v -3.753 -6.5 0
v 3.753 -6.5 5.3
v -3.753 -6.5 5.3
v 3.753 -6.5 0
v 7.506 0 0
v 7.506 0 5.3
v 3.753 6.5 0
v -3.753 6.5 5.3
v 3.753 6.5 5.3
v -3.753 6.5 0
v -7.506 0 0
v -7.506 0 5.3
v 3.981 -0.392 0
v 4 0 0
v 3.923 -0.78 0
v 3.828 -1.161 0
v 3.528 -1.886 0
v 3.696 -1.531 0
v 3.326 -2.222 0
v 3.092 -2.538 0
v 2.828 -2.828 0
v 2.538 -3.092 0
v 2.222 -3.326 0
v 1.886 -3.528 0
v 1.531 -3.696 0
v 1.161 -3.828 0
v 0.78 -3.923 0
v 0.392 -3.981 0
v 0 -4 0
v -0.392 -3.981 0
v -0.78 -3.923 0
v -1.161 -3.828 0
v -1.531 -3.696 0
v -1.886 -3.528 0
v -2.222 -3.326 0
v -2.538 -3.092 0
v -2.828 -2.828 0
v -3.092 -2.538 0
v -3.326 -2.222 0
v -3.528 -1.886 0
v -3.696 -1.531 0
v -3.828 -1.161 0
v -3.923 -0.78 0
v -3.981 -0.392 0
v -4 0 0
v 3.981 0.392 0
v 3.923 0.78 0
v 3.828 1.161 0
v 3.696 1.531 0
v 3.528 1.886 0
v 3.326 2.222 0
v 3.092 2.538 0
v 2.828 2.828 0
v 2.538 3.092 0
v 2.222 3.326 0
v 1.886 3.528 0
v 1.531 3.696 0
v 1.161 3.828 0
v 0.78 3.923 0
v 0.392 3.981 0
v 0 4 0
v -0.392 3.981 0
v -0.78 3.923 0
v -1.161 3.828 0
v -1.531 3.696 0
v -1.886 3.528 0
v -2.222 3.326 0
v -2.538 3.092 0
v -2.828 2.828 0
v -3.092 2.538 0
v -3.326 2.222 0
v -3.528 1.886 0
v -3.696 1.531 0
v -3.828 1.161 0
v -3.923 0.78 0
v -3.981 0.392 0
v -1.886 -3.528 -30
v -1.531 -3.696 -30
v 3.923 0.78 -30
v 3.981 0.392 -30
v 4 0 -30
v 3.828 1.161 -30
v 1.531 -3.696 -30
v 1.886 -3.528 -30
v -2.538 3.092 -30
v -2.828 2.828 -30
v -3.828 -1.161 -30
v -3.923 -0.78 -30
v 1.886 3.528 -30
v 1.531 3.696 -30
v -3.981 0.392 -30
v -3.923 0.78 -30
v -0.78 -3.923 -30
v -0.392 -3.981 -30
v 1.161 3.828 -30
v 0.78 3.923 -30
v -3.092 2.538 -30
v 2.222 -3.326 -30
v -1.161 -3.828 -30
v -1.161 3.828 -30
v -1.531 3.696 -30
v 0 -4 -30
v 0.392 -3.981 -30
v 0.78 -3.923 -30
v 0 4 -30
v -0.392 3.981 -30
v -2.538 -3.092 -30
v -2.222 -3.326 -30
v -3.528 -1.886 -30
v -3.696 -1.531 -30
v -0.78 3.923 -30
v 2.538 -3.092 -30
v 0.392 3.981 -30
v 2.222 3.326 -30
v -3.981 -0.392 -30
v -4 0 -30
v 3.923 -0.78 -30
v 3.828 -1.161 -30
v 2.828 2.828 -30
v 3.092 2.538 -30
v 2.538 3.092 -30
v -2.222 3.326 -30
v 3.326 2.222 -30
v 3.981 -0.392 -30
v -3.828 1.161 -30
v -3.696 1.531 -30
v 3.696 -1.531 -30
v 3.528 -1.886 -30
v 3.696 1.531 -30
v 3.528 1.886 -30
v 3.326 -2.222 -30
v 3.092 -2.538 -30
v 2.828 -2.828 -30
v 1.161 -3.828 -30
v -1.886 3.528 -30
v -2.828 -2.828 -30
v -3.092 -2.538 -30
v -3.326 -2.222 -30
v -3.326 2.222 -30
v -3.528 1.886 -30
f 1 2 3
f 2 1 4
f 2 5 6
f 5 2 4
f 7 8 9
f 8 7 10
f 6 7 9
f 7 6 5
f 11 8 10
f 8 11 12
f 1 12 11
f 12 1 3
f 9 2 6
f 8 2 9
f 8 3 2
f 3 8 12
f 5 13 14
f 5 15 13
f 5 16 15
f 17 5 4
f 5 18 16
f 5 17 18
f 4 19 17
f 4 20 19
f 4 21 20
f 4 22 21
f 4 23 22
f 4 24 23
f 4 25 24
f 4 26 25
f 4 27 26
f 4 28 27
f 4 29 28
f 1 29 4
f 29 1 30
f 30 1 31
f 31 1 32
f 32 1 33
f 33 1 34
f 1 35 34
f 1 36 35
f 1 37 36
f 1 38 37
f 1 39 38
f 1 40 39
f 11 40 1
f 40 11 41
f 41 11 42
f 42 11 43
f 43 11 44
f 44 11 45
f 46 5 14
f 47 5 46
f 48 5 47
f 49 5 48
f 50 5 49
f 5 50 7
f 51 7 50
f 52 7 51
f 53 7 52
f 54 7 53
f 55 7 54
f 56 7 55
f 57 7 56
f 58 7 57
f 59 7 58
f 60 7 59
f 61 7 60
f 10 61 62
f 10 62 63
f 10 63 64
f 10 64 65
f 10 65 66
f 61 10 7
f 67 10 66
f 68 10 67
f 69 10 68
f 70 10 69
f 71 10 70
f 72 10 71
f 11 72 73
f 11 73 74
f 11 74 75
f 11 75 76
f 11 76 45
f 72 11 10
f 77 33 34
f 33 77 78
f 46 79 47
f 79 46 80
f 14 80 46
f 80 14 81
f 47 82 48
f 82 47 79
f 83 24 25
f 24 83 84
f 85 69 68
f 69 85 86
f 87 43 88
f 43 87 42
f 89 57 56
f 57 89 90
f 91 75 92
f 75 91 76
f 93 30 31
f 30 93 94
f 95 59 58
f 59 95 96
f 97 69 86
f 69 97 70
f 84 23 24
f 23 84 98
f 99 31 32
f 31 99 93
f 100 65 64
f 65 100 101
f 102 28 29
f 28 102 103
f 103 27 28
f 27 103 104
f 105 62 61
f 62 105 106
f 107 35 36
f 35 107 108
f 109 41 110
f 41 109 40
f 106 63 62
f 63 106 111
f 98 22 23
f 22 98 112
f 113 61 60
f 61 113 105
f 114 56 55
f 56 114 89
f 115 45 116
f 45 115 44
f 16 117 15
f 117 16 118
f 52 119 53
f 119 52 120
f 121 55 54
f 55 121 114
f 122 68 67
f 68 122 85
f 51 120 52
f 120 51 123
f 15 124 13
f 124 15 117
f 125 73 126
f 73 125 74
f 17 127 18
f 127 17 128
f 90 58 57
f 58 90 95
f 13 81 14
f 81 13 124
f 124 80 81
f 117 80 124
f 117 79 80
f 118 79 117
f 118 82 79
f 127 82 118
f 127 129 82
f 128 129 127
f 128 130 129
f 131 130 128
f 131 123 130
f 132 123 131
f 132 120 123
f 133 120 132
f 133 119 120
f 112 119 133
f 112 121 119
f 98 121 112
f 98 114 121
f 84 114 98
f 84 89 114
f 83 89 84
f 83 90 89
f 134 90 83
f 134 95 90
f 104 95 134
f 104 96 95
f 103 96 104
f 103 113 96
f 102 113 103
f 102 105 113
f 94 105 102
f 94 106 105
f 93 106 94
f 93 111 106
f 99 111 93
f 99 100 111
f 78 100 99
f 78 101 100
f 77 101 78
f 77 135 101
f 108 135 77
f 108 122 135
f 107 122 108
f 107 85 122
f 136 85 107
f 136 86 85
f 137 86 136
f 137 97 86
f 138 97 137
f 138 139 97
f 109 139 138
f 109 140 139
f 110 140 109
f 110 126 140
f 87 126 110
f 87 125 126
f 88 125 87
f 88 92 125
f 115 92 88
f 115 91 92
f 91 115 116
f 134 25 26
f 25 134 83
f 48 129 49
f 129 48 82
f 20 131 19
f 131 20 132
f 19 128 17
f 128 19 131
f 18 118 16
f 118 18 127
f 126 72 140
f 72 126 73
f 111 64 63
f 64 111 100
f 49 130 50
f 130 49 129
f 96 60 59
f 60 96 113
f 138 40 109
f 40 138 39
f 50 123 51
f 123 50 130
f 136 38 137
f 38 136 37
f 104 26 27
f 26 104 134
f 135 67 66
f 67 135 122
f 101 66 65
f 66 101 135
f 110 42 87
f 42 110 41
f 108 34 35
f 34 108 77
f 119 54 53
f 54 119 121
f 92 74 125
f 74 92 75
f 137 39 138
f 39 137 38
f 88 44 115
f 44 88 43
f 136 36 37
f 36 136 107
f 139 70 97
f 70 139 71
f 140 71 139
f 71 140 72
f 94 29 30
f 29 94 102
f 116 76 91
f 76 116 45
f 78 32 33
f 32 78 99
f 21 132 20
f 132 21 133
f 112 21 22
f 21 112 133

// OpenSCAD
// M8 六角ボルト (ねじ山なし)

$fn = 64;

// 頭部 (対辺距離 13mm, 高さ 5.3mm)
// 円の半径 = 対辺距離 / sqrt(3)
cylinder(r = 13 / sqrt(3), h = 5.3, $fn = 6);

// シャンク (直径 8mm, 長さ 30mm, z < 0 側)
translate([0, 0, -30])
cylinder(r = 8 / 2, h = 30);
